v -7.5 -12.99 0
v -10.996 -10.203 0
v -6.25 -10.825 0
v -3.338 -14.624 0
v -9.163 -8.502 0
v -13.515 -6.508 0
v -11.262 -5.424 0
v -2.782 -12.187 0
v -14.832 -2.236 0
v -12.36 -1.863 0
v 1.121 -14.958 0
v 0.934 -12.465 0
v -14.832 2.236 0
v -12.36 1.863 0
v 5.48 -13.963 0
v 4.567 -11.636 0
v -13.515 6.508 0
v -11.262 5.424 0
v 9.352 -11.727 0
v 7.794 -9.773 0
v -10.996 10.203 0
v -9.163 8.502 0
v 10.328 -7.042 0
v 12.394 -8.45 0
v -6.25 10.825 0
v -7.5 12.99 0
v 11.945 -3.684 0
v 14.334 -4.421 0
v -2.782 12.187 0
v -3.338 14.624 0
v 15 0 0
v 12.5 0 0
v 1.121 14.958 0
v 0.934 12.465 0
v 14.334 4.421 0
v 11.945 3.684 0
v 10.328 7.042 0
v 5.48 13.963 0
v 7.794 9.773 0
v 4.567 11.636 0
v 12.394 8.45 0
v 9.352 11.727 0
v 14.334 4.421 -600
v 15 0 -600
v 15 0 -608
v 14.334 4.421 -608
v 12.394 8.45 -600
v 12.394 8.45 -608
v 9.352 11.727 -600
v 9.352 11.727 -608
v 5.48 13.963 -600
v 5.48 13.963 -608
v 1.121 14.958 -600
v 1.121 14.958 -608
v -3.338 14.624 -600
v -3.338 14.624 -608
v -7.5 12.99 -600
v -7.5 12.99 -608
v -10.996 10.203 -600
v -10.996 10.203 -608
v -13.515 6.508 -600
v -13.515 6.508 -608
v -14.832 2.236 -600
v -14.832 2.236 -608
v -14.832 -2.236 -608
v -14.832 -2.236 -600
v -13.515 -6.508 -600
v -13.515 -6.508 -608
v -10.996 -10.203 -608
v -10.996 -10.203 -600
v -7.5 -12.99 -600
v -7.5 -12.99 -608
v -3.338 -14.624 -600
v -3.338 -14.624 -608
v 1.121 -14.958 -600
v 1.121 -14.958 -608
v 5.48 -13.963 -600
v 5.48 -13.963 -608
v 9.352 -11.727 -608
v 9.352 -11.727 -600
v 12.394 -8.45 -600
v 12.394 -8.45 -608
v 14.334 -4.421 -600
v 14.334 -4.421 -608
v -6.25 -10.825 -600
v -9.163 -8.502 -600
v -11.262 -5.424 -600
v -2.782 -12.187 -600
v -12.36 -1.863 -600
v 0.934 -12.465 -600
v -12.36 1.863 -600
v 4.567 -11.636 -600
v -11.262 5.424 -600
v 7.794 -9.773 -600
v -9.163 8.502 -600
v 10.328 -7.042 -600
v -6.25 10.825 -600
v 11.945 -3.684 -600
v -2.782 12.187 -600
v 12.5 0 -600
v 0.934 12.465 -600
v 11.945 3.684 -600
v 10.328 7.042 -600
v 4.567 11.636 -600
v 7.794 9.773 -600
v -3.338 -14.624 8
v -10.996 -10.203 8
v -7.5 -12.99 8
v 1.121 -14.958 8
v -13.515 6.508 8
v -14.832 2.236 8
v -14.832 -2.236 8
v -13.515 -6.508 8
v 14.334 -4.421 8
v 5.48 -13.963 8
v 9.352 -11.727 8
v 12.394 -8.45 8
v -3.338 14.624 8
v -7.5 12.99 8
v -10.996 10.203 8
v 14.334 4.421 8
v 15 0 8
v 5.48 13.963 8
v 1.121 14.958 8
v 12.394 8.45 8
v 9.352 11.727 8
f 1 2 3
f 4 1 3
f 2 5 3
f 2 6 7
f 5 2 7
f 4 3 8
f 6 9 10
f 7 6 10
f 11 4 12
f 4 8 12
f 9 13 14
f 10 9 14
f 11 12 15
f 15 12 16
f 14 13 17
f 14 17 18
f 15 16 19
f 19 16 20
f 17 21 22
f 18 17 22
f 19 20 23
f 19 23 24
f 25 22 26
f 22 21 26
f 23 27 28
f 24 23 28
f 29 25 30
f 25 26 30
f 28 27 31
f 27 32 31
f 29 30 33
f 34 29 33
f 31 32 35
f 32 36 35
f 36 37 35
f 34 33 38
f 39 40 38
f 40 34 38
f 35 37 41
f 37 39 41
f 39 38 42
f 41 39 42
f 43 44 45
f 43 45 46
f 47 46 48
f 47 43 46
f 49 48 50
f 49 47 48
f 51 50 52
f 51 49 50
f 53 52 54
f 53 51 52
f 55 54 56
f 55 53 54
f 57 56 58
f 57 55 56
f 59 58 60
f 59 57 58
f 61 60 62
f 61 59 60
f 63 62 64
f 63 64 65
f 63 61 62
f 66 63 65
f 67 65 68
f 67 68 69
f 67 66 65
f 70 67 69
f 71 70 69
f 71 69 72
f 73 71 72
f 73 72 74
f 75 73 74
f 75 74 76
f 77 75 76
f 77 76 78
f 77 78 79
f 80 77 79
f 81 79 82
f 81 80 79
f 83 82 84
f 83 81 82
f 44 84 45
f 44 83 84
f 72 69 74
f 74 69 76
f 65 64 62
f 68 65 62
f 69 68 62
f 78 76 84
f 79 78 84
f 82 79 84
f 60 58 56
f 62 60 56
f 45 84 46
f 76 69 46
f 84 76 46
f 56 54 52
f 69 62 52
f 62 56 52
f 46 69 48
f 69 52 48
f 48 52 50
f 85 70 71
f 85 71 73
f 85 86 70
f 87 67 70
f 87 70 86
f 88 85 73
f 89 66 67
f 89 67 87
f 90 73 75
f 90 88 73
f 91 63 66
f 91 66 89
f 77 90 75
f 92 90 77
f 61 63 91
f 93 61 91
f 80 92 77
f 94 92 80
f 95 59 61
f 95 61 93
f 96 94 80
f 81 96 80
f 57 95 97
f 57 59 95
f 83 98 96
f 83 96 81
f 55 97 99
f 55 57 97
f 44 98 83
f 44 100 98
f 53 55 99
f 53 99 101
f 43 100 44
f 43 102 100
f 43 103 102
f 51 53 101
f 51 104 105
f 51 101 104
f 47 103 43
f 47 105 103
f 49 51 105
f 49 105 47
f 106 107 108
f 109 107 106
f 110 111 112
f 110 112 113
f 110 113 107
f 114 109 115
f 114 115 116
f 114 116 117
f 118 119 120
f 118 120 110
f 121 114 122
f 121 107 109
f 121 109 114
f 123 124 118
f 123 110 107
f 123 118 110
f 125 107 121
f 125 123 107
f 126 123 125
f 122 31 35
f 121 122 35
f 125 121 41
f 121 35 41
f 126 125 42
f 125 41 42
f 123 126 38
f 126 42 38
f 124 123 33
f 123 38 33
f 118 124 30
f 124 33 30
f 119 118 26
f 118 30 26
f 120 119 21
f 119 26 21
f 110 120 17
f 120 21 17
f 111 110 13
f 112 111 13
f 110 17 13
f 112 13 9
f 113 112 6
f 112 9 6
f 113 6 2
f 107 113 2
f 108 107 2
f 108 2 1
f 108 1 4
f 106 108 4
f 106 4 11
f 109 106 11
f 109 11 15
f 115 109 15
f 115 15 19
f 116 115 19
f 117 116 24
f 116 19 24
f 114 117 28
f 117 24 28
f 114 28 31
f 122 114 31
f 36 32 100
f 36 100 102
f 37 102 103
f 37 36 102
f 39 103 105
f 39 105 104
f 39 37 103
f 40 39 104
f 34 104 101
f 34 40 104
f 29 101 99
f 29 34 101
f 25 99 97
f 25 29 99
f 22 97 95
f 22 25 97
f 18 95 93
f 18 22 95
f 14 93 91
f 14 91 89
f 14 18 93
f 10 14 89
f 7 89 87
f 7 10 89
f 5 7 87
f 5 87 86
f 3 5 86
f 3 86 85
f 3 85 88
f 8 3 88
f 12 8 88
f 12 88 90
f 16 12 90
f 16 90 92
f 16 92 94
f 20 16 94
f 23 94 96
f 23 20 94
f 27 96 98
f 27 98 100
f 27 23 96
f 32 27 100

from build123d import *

# Parameters (mm, degrees)
CROQUIS1_R              = 12.5
SALIENTE_EXTRUIR1_DEPTH = 600
CROQUIS2_R              = 15
SALIENTE_EXTRUIR2_DEPTH = 8


with BuildPart() as part:
    # Croquis1 → Saliente-Extruir1 (new body)
    with BuildSketch(Plane.XY):
        Circle(CROQUIS1_R)
    extrude(amount=-SALIENTE_EXTRUIR1_DEPTH)

    # Croquis2 → Saliente-Extruir2 (add)
    with BuildSketch(Plane.XY):
        Circle(CROQUIS2_R)
    saliente_extruir2 = extrude(amount=SALIENTE_EXTRUIR2_DEPTH)

    # Simetría1: Saliente-Extruir2 across plane
    add(saliente_extruir2.mirror(Plane.XY.offset(-300)))


solid = part.part
